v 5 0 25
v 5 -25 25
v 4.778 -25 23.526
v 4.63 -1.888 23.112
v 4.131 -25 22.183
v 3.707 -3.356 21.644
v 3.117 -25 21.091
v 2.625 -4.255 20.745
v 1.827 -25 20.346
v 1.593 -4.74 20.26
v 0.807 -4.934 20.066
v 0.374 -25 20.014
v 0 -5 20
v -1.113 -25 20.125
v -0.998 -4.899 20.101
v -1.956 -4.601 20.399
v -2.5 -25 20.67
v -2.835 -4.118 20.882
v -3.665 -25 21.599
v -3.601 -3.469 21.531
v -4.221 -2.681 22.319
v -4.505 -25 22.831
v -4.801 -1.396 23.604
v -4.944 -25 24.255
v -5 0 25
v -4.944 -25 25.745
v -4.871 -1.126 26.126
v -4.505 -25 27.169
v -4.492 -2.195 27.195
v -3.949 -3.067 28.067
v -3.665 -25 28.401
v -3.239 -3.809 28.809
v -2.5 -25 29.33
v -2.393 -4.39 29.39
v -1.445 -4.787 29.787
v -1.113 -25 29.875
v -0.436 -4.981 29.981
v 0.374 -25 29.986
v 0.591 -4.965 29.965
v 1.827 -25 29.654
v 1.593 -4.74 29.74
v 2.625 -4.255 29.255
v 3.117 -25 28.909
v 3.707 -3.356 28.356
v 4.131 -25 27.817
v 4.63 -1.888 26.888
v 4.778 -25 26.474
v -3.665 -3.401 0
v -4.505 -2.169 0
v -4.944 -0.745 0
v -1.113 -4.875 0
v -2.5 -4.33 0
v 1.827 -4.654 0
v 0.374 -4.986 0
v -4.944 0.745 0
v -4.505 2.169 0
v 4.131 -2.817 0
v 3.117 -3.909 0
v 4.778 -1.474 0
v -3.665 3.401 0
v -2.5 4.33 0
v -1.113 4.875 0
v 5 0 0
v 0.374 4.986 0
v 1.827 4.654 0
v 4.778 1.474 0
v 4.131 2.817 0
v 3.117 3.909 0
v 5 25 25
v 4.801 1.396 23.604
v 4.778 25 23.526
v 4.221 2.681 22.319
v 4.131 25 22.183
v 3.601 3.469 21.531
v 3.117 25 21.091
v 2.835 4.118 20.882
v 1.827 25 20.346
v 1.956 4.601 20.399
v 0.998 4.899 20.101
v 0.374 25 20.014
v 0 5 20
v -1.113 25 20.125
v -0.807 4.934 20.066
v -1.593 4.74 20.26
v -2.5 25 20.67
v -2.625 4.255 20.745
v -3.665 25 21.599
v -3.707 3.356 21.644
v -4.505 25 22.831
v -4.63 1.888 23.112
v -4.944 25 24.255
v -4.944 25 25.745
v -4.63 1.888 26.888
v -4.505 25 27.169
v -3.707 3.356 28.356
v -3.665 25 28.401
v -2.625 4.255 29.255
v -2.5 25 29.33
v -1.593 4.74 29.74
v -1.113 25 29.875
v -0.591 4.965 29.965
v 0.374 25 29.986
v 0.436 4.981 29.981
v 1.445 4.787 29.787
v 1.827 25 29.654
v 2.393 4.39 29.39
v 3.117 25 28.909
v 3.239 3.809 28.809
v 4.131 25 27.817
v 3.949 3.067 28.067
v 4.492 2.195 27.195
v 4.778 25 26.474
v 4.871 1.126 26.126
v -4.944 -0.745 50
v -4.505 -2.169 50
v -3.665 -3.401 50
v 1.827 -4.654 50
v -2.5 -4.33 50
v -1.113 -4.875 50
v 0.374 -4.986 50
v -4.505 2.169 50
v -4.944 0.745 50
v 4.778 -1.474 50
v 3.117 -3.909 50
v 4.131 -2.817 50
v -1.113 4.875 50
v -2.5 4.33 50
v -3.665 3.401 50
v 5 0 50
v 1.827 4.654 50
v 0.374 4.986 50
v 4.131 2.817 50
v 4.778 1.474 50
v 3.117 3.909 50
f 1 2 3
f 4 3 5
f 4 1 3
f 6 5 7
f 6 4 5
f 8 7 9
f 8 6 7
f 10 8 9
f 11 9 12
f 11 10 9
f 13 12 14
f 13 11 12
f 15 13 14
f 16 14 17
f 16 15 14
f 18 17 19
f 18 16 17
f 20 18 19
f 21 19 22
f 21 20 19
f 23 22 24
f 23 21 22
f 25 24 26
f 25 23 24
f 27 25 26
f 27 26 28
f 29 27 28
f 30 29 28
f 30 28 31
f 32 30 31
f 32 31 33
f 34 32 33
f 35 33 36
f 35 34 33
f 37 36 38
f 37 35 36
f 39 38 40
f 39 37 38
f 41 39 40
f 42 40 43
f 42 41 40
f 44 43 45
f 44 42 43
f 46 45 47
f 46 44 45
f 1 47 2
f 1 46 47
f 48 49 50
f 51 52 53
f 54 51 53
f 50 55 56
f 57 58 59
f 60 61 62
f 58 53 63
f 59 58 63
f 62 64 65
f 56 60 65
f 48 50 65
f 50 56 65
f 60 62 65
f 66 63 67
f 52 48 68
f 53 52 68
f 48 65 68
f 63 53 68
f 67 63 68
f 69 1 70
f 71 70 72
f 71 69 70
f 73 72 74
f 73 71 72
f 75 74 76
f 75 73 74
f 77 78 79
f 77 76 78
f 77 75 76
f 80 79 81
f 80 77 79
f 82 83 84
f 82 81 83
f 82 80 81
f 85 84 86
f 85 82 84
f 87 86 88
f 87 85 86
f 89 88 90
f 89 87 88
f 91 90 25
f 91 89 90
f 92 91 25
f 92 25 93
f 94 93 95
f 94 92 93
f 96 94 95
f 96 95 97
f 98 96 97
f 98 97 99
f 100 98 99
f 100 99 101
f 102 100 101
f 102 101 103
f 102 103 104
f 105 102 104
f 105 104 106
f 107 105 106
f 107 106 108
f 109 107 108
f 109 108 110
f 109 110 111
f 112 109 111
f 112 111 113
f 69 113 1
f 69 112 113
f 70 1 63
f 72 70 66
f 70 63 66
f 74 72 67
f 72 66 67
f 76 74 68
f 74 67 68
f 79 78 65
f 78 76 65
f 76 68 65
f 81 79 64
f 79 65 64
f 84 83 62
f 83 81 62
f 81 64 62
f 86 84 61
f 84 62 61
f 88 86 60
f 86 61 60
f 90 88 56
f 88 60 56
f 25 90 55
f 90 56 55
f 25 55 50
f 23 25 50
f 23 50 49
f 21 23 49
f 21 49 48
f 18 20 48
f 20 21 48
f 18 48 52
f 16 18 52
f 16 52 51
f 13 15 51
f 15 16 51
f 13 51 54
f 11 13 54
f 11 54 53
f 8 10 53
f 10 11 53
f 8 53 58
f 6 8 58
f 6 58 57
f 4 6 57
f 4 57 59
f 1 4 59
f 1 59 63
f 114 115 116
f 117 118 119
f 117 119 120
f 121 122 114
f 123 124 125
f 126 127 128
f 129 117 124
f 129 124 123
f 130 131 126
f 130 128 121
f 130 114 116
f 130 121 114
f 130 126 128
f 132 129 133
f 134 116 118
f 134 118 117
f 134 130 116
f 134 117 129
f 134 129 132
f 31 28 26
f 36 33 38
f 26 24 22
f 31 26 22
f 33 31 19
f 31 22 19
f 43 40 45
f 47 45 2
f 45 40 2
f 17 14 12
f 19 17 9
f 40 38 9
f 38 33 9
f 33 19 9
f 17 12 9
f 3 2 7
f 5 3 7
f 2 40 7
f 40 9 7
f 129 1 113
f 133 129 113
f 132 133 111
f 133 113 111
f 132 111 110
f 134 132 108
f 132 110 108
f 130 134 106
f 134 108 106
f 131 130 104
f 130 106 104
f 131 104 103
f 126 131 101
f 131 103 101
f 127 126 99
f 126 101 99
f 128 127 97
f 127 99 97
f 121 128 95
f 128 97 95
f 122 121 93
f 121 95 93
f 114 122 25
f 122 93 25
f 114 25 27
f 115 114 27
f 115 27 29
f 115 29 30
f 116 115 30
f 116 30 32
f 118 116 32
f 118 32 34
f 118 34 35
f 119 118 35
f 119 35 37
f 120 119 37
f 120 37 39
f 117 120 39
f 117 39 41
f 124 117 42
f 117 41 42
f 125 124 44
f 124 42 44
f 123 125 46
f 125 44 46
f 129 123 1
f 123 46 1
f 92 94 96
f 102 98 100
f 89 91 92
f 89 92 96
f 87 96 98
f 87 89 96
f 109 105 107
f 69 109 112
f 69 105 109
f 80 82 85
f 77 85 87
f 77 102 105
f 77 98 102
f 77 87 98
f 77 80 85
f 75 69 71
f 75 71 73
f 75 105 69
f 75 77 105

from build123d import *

# Parameters (mm, degrees)
SKETCH2_R           = 5
BOSS_EXTRUDE1_DEPTH = 50
SKETCH5_R           = 5
BOSS_EXTRUDE2_DEPTH = 50


with BuildPart() as part:
    # Sketch2 → Boss-Extrude1 (new body)
    with BuildSketch(Plane.XY):
        Circle(SKETCH2_R)
    extrude(amount=BOSS_EXTRUDE1_DEPTH)

    # Sketch5 → Boss-Extrude2 (add)
    with BuildSketch(Plane(origin=(0, 25, 0), x_dir=(1, 0, 0), z_dir=(0, 1, 0))):
        with Locations((0, -25)):
            Circle(SKETCH5_R)
    extrude(amount=-BOSS_EXTRUDE2_DEPTH)


solid = part.part
